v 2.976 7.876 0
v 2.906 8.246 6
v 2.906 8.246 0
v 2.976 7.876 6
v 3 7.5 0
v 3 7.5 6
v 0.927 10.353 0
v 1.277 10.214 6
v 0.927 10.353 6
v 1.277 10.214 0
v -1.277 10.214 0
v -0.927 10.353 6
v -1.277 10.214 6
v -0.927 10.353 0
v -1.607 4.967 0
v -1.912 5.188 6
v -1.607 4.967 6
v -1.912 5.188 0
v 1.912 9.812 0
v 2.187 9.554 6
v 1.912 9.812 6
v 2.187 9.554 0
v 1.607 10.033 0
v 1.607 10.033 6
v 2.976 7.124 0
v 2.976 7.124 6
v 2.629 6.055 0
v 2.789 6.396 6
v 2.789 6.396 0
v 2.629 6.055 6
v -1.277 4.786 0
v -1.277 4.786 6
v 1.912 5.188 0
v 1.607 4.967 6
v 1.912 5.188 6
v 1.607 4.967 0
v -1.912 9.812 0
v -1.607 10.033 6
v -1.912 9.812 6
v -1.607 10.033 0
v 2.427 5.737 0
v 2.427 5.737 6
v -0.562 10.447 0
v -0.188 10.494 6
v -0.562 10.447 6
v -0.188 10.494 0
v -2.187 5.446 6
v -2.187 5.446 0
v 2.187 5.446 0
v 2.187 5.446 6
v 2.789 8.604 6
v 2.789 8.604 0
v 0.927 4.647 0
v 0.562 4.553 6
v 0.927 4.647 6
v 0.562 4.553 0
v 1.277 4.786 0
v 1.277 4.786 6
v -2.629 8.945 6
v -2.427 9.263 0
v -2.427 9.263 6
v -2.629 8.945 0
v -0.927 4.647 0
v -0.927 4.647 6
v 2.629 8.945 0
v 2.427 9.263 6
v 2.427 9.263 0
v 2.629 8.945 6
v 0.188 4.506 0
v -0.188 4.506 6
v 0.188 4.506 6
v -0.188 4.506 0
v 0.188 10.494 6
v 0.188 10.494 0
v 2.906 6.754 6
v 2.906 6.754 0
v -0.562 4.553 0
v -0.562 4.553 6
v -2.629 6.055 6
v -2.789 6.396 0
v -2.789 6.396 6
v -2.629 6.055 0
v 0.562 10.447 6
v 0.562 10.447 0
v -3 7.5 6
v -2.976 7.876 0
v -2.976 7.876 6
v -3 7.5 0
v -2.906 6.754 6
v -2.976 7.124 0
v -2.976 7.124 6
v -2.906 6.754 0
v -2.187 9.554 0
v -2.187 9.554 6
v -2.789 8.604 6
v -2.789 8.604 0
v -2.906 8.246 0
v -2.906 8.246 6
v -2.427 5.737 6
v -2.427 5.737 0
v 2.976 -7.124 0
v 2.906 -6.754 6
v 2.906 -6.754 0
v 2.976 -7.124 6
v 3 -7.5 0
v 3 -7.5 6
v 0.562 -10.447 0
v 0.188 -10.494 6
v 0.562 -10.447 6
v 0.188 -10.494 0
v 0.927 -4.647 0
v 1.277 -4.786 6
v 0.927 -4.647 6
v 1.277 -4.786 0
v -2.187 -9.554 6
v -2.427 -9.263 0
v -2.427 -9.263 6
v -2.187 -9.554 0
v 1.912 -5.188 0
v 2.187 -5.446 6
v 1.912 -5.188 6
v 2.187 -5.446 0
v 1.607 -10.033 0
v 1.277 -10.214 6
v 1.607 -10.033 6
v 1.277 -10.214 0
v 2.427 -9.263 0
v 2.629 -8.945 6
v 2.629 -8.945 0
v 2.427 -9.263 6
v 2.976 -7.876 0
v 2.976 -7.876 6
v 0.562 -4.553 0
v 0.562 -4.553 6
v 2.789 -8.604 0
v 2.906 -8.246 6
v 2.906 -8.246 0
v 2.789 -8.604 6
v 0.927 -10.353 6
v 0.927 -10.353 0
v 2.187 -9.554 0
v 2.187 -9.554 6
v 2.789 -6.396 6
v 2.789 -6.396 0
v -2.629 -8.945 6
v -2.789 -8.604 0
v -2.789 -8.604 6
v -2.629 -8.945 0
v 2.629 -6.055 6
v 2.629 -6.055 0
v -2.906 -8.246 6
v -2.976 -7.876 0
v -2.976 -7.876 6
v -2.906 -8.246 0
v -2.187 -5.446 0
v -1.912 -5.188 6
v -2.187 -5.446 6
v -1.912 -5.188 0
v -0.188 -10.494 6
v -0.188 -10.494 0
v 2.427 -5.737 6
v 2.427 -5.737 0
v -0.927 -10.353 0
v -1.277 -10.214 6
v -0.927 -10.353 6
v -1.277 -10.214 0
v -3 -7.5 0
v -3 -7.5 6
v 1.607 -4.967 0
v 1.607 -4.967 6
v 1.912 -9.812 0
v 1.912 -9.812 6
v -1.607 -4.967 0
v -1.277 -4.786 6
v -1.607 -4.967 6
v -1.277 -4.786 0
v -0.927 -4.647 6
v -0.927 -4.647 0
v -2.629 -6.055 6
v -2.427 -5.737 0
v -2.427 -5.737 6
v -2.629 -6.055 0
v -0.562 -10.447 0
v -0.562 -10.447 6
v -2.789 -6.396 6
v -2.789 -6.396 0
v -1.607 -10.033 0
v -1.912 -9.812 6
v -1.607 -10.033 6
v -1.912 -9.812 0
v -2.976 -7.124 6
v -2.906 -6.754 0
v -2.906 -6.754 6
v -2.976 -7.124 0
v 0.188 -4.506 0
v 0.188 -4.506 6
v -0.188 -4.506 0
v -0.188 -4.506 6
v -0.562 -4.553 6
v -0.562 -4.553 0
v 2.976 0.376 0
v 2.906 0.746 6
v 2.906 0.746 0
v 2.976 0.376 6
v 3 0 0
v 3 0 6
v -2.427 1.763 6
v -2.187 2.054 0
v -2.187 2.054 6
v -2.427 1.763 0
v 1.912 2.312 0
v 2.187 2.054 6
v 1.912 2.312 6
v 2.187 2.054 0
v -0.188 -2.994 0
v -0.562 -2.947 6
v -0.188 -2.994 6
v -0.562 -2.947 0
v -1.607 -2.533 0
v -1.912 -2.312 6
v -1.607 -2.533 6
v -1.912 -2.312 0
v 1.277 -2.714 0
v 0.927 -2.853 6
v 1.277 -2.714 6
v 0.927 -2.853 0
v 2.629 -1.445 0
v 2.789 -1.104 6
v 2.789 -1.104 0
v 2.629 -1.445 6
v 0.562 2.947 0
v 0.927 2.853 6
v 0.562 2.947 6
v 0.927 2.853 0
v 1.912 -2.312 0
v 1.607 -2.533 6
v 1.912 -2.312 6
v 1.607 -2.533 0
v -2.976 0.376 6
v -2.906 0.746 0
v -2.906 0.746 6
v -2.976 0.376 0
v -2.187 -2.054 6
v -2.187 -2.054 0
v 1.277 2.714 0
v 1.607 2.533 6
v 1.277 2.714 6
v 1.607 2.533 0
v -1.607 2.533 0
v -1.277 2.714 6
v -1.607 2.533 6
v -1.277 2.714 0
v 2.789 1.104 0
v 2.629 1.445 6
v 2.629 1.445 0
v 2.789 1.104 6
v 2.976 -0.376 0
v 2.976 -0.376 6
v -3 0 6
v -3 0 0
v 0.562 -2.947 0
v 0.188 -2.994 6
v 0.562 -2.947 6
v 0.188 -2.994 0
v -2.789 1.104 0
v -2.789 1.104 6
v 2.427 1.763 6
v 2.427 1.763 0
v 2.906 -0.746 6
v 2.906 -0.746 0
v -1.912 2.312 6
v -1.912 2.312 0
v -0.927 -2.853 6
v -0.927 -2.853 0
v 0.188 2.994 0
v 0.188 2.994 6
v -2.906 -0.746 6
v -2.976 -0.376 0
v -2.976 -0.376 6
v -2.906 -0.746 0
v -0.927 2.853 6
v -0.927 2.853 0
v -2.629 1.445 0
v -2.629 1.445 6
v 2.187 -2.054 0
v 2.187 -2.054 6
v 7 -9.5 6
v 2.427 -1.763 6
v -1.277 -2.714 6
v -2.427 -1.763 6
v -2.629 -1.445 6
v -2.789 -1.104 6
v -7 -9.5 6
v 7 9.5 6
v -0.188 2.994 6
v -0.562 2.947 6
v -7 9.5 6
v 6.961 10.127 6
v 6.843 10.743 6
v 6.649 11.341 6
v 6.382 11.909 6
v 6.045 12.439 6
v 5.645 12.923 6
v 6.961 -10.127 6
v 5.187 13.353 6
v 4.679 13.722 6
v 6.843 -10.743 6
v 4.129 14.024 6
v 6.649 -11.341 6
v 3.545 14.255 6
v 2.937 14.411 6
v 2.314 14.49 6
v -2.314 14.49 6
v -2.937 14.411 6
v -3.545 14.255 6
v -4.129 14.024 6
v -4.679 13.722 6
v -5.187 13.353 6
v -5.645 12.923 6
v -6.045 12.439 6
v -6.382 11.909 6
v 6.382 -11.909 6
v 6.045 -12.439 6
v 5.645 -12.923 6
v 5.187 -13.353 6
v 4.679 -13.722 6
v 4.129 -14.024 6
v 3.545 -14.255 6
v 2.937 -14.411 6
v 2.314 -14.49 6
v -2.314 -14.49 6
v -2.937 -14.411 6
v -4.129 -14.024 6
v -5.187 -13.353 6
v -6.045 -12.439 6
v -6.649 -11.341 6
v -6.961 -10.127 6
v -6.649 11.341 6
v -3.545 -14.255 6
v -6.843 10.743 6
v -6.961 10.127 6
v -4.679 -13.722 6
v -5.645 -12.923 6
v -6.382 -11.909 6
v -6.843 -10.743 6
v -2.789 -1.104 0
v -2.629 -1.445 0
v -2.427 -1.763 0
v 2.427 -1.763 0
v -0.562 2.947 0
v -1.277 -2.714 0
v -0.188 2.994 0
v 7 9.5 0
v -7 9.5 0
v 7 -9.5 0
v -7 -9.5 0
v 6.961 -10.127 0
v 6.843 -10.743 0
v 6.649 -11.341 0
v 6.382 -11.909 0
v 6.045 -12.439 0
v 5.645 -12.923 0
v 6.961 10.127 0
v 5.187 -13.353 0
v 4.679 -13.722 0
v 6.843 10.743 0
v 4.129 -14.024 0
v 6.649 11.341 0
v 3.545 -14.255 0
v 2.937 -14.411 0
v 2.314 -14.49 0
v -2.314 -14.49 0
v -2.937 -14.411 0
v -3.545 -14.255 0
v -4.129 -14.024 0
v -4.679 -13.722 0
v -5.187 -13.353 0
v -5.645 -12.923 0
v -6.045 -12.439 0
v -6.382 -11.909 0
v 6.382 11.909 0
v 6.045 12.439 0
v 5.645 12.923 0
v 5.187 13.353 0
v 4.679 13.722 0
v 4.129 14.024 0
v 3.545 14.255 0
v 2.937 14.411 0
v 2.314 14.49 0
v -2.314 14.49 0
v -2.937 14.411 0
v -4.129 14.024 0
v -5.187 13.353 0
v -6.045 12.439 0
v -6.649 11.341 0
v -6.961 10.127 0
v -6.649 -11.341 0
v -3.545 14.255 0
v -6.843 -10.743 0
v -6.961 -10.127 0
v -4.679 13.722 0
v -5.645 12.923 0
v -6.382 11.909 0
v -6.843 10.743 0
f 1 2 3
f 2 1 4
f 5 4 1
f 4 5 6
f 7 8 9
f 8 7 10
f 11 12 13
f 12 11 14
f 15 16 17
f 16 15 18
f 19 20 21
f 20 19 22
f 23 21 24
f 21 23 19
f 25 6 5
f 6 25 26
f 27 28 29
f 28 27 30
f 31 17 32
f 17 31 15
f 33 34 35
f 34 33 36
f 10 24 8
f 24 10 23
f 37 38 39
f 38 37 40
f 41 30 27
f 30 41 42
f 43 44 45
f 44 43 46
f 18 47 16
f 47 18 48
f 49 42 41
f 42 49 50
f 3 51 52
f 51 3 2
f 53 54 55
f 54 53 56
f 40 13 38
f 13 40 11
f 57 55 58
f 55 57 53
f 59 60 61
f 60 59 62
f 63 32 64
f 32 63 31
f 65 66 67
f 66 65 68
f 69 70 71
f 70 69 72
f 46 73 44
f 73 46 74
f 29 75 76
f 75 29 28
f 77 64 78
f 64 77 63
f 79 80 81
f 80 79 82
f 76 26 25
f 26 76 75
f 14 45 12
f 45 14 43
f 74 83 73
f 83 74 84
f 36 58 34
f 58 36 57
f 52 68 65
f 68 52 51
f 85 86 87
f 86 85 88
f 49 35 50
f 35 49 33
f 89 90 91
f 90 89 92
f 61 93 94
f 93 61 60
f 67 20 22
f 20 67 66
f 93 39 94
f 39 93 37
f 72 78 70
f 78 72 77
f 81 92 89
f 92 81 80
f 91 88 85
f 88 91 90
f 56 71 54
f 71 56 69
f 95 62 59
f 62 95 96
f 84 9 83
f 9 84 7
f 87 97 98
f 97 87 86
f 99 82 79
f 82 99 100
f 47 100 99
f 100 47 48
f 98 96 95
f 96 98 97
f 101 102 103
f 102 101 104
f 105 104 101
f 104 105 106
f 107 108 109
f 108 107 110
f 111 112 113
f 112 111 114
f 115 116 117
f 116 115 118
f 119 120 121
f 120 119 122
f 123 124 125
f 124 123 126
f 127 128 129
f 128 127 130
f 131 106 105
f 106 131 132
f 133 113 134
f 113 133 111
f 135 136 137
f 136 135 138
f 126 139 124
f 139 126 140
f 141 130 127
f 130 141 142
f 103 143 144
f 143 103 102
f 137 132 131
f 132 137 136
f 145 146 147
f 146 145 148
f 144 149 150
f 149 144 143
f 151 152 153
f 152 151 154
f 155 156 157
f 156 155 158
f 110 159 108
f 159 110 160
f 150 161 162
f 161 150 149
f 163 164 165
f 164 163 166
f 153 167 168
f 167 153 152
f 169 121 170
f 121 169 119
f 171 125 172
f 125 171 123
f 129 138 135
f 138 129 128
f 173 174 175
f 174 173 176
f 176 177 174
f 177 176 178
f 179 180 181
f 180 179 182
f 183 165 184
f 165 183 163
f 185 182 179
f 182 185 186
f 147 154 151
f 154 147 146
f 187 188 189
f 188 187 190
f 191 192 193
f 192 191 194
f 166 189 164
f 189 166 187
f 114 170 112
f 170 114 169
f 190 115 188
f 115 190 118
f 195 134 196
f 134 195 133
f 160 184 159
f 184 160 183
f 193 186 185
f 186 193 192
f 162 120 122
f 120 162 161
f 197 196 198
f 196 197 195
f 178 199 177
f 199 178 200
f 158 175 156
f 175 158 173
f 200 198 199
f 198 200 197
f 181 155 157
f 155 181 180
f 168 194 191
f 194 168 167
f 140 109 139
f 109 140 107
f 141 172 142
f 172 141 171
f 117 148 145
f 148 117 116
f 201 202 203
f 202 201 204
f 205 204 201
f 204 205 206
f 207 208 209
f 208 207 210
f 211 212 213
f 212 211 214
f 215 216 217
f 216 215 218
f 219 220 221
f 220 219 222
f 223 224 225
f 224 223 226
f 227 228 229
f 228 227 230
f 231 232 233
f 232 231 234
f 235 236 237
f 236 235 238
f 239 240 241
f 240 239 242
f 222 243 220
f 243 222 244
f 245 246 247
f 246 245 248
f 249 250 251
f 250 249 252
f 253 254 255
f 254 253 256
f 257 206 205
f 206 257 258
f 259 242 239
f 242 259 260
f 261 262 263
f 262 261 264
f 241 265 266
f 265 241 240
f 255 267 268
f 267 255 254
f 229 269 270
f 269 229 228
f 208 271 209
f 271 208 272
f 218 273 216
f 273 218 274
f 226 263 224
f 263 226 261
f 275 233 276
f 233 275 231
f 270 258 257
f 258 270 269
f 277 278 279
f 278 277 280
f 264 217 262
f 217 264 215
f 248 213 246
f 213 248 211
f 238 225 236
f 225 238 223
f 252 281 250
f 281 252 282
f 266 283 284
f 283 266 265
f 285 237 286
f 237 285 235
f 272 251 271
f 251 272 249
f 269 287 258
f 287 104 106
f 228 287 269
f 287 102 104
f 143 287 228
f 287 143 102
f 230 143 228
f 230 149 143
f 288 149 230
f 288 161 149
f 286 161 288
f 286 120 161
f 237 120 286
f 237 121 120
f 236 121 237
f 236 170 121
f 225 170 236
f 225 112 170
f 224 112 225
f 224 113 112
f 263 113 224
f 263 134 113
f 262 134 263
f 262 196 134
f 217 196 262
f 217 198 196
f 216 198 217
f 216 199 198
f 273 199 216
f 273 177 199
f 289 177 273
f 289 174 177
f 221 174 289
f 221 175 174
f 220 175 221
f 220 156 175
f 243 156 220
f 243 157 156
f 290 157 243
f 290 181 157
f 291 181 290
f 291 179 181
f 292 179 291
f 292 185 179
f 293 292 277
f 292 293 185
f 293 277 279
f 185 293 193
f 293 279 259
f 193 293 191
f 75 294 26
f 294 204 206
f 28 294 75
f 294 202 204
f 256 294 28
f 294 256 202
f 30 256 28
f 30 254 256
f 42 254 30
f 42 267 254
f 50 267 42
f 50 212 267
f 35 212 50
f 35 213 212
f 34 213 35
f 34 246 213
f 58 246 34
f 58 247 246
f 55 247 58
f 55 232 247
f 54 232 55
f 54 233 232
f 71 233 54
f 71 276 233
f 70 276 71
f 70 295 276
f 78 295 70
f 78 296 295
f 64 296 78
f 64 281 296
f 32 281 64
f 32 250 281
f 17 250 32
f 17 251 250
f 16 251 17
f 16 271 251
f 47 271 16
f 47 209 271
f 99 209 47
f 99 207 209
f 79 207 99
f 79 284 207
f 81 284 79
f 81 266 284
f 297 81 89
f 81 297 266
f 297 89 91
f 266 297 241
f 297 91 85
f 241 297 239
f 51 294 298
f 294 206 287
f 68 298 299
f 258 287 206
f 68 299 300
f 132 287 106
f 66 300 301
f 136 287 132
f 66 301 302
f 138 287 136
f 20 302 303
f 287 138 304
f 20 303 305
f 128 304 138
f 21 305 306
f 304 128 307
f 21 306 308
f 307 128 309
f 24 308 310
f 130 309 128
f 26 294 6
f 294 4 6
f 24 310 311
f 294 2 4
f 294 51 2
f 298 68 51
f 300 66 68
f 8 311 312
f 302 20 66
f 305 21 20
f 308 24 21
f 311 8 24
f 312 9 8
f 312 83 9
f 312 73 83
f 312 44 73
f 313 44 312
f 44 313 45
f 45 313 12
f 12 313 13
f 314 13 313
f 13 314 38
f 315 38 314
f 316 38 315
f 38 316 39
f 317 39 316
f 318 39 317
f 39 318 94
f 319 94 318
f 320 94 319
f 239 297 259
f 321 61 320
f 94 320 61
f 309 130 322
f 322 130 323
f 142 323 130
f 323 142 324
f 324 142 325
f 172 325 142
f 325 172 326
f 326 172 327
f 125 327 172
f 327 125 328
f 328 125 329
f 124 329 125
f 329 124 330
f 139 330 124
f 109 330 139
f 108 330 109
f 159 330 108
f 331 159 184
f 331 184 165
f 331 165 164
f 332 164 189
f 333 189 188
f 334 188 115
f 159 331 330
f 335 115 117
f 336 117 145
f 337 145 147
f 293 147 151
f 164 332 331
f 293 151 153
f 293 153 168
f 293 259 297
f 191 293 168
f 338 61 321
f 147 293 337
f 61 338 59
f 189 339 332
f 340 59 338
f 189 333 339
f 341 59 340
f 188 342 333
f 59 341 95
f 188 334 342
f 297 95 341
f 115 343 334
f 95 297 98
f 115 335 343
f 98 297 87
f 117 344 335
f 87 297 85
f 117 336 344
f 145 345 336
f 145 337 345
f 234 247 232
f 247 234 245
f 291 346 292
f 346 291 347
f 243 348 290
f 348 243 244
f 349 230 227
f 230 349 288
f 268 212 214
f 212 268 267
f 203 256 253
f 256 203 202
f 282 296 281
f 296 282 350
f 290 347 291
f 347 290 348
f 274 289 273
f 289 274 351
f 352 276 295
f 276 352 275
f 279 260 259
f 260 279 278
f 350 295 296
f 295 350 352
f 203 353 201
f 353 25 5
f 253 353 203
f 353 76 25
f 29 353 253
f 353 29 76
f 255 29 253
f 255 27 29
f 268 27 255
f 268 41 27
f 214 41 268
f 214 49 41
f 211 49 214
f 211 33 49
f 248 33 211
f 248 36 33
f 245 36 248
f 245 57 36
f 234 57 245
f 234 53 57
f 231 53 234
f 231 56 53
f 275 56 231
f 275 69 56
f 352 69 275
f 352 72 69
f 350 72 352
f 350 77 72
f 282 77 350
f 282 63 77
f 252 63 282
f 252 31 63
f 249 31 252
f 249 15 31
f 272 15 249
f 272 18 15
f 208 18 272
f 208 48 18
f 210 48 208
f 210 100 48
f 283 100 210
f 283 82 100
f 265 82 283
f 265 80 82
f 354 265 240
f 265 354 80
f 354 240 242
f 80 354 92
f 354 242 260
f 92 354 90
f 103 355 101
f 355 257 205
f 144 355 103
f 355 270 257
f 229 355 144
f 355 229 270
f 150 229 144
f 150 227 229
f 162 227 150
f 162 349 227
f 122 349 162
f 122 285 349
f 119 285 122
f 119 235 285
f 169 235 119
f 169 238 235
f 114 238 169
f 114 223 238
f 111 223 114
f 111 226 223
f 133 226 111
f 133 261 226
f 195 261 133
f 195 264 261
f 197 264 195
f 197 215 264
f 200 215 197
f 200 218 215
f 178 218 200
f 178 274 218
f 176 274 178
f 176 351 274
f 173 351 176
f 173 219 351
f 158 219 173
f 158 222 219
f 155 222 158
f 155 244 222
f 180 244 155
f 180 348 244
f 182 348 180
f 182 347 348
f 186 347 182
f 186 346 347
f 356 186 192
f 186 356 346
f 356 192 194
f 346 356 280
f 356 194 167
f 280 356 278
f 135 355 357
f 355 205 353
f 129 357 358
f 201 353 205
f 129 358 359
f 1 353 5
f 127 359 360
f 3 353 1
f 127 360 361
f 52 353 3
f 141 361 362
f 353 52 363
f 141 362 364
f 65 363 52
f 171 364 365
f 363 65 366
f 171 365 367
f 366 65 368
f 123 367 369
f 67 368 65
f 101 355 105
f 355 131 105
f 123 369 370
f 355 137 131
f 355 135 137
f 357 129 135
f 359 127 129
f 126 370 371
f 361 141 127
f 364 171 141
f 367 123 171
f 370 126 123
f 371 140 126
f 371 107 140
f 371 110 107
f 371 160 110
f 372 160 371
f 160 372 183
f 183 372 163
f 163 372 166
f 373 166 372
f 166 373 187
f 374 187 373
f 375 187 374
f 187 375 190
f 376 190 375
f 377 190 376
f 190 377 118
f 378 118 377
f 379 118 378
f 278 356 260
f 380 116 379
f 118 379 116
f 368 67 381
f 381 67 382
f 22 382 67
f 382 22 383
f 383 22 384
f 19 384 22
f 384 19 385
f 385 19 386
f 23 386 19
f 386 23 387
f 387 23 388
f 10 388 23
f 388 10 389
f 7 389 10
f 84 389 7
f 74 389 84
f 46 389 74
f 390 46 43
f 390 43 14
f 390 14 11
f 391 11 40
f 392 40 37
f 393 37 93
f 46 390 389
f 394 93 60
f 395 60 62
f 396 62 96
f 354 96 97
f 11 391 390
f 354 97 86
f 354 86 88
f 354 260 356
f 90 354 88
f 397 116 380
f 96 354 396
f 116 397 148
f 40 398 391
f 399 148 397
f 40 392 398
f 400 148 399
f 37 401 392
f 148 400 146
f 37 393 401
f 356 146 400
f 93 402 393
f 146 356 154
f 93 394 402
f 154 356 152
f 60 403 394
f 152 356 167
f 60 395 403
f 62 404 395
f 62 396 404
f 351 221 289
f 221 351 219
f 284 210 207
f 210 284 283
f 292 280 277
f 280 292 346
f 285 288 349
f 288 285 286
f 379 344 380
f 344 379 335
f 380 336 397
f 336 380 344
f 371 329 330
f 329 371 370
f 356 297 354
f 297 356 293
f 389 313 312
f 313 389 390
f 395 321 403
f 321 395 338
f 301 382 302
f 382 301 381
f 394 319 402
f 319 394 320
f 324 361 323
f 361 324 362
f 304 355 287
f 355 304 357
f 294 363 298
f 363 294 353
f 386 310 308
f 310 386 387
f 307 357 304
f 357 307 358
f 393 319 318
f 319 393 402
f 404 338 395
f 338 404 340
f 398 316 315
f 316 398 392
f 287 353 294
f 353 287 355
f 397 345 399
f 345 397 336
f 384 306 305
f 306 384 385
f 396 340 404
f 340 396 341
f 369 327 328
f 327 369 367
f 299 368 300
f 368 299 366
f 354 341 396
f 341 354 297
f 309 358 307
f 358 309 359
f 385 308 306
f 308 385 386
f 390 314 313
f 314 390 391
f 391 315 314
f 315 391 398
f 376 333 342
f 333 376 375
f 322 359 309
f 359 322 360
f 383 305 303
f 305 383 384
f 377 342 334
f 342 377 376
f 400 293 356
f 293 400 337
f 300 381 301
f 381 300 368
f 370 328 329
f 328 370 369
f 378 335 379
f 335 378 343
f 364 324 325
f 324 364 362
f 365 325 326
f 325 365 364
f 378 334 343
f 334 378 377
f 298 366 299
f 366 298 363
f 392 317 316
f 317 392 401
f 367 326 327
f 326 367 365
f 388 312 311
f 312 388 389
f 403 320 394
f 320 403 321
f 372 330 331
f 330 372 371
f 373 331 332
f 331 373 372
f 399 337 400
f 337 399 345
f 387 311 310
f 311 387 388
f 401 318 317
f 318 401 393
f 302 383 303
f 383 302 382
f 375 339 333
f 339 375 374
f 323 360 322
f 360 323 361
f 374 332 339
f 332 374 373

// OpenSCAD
$fn = 50;


difference() {
	union() {
		hull() {
			translate(v = [-2.0000000000, 9.5000000000, 0]) {
				cylinder(h = 6, r = 5);
			}
			translate(v = [2.0000000000, 9.5000000000, 0]) {
				cylinder(h = 6, r = 5);
			}
			translate(v = [-2.0000000000, -9.5000000000, 0]) {
				cylinder(h = 6, r = 5);
			}
			translate(v = [2.0000000000, -9.5000000000, 0]) {
				cylinder(h = 6, r = 5);
			}
		}
	}
	union() {
		#translate(v = [0.0000000000, 7.5000000000, 0]) {
			cylinder(h = 6, r = 3.0000000000);
		}
		#translate(v = [0.0000000000, -7.5000000000, 0]) {
			cylinder(h = 6, r = 3.0000000000);
		}
		#translate(v = [0.0000000000, -7.5000000000, -100.0000000000]) {
			cylinder(h = 200, r = 3.0000000000);
		}
		#translate(v = [0.0000000000, -7.5000000000, -100.0000000000]) {
			cylinder(h = 200, r = 3.0000000000);
		}
		#translate(v = [0.0000000000, 7.5000000000, -100.0000000000]) {
			cylinder(h = 200, r = 3.0000000000);
		}
		#translate(v = [0.0000000000, 7.5000000000, -100.0000000000]) {
			cylinder(h = 200, r = 3.0000000000);
		}
		#translate(v = [0.0000000000, 7.5000000000, 0]) {
			cylinder(h = 6, r = 1.5000000000);
		}
		#translate(v = [0.0000000000, -7.5000000000, 0]) {
			cylinder(h = 6, r = 1.5000000000);
		}
		#translate(v = [0.0000000000, 7.5000000000, 0]) {
			cylinder(h = 6, r = 1.5000000000);
		}
		#translate(v = [0.0000000000, -7.5000000000, 0]) {
			cylinder(h = 6, r = 1.5000000000);
		}
		#translate(v = [0.0000000000, 7.5000000000, 0]) {
			cylinder(h = 6, r = 1.5000000000);
		}
		#translate(v = [0.0000000000, -7.5000000000, 0]) {
			cylinder(h = 6, r = 1.5000000000);
		}
		#cylinder(h = 6, r = 3.0000000000);
	}
}
